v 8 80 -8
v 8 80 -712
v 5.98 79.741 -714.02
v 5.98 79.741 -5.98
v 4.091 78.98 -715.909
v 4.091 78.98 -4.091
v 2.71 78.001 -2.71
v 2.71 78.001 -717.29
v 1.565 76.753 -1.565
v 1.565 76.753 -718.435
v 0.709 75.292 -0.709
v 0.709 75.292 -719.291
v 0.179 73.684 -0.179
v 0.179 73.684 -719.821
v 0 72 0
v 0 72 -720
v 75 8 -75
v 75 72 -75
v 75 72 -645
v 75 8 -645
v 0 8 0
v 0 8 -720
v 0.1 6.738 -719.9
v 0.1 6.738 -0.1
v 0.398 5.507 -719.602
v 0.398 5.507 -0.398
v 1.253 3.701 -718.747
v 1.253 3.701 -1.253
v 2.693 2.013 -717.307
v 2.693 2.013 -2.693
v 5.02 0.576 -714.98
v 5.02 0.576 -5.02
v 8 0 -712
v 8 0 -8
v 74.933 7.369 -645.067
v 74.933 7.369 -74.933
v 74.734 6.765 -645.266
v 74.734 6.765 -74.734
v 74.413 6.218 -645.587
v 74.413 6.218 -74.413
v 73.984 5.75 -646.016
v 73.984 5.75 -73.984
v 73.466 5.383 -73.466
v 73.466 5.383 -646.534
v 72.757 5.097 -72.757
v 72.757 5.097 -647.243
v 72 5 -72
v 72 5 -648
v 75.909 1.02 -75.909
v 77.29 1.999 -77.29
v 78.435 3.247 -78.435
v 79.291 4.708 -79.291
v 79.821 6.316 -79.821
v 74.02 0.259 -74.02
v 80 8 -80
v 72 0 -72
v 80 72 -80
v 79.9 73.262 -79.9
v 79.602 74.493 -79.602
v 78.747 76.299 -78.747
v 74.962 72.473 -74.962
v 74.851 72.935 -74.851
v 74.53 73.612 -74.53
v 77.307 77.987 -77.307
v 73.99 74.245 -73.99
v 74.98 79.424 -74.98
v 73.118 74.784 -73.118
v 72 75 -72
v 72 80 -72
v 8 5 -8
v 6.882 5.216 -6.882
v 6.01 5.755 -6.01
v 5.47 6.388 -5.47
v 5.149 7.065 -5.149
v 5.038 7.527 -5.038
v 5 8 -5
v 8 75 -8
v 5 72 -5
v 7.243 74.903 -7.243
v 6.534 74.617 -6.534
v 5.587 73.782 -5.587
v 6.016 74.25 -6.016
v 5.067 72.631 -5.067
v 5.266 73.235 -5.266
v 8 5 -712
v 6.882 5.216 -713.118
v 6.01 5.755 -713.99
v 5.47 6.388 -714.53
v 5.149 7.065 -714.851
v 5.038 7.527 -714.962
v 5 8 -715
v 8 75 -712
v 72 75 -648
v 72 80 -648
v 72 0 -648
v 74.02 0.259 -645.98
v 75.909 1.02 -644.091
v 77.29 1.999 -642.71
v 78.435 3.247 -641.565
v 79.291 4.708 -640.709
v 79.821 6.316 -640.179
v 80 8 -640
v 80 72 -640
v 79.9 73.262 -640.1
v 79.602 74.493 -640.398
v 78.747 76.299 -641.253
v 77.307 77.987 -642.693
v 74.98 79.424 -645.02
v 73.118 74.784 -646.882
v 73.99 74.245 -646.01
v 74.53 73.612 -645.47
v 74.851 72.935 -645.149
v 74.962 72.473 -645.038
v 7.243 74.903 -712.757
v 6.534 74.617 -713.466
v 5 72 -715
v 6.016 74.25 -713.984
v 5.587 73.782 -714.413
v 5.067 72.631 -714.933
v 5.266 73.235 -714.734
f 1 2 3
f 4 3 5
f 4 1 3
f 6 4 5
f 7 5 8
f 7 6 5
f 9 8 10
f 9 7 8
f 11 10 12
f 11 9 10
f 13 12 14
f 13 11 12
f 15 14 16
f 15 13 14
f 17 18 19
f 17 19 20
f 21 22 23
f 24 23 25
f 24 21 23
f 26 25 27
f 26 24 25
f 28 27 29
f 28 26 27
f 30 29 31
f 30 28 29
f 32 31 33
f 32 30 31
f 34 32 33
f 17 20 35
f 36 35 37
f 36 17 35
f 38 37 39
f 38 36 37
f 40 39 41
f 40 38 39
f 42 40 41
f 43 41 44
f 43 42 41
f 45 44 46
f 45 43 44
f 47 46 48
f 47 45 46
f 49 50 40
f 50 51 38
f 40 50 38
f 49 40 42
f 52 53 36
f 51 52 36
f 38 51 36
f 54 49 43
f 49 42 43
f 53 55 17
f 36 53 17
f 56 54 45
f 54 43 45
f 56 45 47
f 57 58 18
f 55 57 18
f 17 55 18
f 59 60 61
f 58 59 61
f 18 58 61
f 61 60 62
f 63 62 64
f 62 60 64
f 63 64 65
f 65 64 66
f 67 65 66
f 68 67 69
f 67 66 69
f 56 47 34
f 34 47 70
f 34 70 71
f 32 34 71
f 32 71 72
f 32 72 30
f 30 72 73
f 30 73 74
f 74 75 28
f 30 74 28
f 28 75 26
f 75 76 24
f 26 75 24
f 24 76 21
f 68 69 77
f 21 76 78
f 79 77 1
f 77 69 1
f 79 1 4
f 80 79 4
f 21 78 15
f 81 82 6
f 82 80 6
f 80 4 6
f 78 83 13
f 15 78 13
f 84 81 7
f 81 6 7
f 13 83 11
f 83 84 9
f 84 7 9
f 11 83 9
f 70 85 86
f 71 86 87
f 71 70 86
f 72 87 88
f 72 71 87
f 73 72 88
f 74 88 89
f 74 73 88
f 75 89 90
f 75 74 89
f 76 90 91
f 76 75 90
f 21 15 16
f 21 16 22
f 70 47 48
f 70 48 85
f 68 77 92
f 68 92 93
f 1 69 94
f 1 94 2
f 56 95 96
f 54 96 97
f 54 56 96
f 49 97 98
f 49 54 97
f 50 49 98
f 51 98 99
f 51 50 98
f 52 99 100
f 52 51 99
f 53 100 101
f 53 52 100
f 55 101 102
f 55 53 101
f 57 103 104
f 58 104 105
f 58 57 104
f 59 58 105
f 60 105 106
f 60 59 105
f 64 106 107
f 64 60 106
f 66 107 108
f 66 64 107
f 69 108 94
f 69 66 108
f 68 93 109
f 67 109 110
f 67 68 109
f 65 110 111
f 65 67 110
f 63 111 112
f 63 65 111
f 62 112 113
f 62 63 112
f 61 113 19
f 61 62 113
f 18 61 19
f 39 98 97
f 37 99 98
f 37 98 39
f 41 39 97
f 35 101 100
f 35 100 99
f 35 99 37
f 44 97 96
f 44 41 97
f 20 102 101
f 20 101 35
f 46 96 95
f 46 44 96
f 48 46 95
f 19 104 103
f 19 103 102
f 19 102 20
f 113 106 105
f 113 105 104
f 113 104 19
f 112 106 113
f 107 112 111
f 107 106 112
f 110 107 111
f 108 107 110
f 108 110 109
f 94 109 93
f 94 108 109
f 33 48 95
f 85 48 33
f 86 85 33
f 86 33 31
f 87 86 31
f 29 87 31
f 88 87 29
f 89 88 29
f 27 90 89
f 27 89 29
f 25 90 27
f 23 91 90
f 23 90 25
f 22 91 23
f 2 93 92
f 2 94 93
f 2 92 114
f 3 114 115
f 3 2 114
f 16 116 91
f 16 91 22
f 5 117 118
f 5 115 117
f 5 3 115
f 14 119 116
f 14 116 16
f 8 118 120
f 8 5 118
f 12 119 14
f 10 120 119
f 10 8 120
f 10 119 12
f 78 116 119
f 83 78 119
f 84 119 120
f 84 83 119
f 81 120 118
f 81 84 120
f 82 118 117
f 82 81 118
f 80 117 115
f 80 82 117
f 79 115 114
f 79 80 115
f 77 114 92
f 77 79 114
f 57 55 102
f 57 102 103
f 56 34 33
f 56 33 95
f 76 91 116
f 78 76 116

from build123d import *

# Parameters (mm, degrees)
DODANIE_WYCI_GNI_CIE1_DEPTH = 720
WYTNIJ_WYCI_GNI_CIE1_DEPTH  = 729.834686332


with BuildPart() as part:
    # Szkic1 → Dodanie-wyciągnięcie1 (new body)
    with BuildSketch(Plane.XY):
        with BuildLine():
            Line((8, 0), (72, 0))
            ThreePointArc((72, 0), (77.656854249, 2.343145751), (80, 8))
            Line((80, 8), (80, 72))
            ThreePointArc((80, 72), (77.656854249, 77.656854249), (72, 80))
            Line((72, 80), (8, 80))
            ThreePointArc((8, 80), (2.343145751, 77.656854249), (0, 72))
            Line((0, 72), (0, 8))
            ThreePointArc((0, 8), (2.343145751, 2.343145751), (8, 0))
        make_face()
        with BuildLine():
            Line((5, 8), (5, 72))
            ThreePointArc((5, 72), (5.878679656, 74.121320344), (8, 75))
            Line((8, 75), (72, 75))
            ThreePointArc((72, 75), (74.121320344, 74.121320344), (75, 72))
            Line((75, 72), (75, 8))
            ThreePointArc((75, 8), (74.121320344, 5.878679656), (72, 5))
            Line((72, 5), (8, 5))
            ThreePointArc((8, 5), (5.878679656, 5.878679656), (5, 8))
        make_face(mode=Mode.SUBTRACT)
    extrude(amount=-DODANIE_WYCI_GNI_CIE1_DEPTH)

    # Szkic2 → Wytnij-wyciągnięcie1 (cut, through all)
    with BuildSketch(Plane(origin=(0, 80, 0), x_dir=(1, 0, 0), z_dir=(0, 1, 0))):
        Polygon((0, 0), (80, 0), (80, 80), align=None)
        Polygon((80, 640), (0, 720), (80, 720), align=None)
    extrude(amount=-WYTNIJ_WYCI_GNI_CIE1_DEPTH, mode=Mode.SUBTRACT)


solid = part.part
